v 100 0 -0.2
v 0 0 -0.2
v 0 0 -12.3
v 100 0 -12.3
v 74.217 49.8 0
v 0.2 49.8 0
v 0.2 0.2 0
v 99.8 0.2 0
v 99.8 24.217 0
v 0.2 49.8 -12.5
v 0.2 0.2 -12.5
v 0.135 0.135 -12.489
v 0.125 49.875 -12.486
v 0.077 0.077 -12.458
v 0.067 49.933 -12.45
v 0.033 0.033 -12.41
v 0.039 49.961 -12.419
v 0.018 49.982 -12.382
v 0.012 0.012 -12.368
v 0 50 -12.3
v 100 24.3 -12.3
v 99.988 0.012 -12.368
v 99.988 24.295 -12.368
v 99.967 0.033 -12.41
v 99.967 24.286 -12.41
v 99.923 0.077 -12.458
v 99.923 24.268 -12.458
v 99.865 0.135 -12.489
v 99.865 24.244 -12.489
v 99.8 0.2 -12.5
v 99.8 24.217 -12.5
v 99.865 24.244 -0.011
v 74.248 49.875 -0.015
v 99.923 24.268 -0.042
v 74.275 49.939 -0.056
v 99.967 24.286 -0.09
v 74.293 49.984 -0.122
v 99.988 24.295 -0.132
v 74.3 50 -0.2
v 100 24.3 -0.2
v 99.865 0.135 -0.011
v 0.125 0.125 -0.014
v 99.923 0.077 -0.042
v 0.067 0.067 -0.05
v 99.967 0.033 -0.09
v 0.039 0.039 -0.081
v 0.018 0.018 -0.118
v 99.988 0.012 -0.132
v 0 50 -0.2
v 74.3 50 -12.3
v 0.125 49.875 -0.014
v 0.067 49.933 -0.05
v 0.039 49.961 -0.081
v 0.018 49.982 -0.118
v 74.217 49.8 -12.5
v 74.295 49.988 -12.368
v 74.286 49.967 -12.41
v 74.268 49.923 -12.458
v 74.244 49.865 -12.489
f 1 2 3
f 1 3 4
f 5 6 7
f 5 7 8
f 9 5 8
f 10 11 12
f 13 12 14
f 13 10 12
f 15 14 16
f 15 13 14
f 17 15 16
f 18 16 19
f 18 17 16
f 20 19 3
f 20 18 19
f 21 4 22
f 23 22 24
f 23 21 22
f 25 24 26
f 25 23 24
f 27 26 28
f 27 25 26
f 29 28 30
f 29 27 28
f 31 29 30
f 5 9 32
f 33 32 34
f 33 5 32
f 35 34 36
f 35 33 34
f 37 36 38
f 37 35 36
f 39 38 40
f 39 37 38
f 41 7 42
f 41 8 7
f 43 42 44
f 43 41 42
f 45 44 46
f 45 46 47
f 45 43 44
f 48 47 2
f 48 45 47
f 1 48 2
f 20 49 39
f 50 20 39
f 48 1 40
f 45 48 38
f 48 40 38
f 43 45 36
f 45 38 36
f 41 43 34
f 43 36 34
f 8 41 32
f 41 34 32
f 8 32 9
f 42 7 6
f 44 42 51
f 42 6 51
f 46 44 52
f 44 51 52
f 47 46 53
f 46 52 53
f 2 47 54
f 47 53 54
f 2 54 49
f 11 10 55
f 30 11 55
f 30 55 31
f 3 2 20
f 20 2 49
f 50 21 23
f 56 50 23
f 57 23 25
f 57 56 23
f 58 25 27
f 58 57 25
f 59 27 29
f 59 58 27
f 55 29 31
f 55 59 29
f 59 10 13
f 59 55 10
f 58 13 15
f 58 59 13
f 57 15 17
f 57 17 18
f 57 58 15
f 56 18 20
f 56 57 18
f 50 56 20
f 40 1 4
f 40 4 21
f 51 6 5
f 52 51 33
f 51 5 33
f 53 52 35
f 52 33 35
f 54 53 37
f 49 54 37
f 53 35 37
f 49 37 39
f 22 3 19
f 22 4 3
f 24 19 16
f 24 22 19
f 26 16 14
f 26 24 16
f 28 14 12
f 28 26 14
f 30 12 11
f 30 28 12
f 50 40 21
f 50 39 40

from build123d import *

# Parameters (mm, degrees)
F0_W     = 100
F0_H     = 50
F1_DEPTH = 12.5
F2_SIZE  = 25.7
F3_R     = 0.2


with BuildPart() as f1:
    # F0 (on Top) → F1 (new body)
    with BuildSketch(Plane.XY):
        with Locations((50, 25)):
            Rectangle(F0_W, F0_H)
    extrude(amount=-F1_DEPTH)

    # F2
    f2_edges = [f1.edges().sort_by_distance(p)[0] for p in [
        (100, 50, -6.25),
    ]]
    chamfer(f2_edges, length=F2_SIZE)

    # F3
    f3_edges = [f1.edges().sort_by_distance(p)[0] for p in [
        (100, 12.15, 0),
        (87.15, 37.15, 0),
        (50, 0, 0),
        (37.15, 50, 0),
        (0, 25, 0),
        (100, 12.15, -12.5),
        (87.15, 37.15, -12.5),
        (50, 0, -12.5),
        (37.15, 50, -12.5),
        (0, 25, -12.5),
    ]]
    fillet(f3_edges, radius=F3_R)


solid = f1.part
